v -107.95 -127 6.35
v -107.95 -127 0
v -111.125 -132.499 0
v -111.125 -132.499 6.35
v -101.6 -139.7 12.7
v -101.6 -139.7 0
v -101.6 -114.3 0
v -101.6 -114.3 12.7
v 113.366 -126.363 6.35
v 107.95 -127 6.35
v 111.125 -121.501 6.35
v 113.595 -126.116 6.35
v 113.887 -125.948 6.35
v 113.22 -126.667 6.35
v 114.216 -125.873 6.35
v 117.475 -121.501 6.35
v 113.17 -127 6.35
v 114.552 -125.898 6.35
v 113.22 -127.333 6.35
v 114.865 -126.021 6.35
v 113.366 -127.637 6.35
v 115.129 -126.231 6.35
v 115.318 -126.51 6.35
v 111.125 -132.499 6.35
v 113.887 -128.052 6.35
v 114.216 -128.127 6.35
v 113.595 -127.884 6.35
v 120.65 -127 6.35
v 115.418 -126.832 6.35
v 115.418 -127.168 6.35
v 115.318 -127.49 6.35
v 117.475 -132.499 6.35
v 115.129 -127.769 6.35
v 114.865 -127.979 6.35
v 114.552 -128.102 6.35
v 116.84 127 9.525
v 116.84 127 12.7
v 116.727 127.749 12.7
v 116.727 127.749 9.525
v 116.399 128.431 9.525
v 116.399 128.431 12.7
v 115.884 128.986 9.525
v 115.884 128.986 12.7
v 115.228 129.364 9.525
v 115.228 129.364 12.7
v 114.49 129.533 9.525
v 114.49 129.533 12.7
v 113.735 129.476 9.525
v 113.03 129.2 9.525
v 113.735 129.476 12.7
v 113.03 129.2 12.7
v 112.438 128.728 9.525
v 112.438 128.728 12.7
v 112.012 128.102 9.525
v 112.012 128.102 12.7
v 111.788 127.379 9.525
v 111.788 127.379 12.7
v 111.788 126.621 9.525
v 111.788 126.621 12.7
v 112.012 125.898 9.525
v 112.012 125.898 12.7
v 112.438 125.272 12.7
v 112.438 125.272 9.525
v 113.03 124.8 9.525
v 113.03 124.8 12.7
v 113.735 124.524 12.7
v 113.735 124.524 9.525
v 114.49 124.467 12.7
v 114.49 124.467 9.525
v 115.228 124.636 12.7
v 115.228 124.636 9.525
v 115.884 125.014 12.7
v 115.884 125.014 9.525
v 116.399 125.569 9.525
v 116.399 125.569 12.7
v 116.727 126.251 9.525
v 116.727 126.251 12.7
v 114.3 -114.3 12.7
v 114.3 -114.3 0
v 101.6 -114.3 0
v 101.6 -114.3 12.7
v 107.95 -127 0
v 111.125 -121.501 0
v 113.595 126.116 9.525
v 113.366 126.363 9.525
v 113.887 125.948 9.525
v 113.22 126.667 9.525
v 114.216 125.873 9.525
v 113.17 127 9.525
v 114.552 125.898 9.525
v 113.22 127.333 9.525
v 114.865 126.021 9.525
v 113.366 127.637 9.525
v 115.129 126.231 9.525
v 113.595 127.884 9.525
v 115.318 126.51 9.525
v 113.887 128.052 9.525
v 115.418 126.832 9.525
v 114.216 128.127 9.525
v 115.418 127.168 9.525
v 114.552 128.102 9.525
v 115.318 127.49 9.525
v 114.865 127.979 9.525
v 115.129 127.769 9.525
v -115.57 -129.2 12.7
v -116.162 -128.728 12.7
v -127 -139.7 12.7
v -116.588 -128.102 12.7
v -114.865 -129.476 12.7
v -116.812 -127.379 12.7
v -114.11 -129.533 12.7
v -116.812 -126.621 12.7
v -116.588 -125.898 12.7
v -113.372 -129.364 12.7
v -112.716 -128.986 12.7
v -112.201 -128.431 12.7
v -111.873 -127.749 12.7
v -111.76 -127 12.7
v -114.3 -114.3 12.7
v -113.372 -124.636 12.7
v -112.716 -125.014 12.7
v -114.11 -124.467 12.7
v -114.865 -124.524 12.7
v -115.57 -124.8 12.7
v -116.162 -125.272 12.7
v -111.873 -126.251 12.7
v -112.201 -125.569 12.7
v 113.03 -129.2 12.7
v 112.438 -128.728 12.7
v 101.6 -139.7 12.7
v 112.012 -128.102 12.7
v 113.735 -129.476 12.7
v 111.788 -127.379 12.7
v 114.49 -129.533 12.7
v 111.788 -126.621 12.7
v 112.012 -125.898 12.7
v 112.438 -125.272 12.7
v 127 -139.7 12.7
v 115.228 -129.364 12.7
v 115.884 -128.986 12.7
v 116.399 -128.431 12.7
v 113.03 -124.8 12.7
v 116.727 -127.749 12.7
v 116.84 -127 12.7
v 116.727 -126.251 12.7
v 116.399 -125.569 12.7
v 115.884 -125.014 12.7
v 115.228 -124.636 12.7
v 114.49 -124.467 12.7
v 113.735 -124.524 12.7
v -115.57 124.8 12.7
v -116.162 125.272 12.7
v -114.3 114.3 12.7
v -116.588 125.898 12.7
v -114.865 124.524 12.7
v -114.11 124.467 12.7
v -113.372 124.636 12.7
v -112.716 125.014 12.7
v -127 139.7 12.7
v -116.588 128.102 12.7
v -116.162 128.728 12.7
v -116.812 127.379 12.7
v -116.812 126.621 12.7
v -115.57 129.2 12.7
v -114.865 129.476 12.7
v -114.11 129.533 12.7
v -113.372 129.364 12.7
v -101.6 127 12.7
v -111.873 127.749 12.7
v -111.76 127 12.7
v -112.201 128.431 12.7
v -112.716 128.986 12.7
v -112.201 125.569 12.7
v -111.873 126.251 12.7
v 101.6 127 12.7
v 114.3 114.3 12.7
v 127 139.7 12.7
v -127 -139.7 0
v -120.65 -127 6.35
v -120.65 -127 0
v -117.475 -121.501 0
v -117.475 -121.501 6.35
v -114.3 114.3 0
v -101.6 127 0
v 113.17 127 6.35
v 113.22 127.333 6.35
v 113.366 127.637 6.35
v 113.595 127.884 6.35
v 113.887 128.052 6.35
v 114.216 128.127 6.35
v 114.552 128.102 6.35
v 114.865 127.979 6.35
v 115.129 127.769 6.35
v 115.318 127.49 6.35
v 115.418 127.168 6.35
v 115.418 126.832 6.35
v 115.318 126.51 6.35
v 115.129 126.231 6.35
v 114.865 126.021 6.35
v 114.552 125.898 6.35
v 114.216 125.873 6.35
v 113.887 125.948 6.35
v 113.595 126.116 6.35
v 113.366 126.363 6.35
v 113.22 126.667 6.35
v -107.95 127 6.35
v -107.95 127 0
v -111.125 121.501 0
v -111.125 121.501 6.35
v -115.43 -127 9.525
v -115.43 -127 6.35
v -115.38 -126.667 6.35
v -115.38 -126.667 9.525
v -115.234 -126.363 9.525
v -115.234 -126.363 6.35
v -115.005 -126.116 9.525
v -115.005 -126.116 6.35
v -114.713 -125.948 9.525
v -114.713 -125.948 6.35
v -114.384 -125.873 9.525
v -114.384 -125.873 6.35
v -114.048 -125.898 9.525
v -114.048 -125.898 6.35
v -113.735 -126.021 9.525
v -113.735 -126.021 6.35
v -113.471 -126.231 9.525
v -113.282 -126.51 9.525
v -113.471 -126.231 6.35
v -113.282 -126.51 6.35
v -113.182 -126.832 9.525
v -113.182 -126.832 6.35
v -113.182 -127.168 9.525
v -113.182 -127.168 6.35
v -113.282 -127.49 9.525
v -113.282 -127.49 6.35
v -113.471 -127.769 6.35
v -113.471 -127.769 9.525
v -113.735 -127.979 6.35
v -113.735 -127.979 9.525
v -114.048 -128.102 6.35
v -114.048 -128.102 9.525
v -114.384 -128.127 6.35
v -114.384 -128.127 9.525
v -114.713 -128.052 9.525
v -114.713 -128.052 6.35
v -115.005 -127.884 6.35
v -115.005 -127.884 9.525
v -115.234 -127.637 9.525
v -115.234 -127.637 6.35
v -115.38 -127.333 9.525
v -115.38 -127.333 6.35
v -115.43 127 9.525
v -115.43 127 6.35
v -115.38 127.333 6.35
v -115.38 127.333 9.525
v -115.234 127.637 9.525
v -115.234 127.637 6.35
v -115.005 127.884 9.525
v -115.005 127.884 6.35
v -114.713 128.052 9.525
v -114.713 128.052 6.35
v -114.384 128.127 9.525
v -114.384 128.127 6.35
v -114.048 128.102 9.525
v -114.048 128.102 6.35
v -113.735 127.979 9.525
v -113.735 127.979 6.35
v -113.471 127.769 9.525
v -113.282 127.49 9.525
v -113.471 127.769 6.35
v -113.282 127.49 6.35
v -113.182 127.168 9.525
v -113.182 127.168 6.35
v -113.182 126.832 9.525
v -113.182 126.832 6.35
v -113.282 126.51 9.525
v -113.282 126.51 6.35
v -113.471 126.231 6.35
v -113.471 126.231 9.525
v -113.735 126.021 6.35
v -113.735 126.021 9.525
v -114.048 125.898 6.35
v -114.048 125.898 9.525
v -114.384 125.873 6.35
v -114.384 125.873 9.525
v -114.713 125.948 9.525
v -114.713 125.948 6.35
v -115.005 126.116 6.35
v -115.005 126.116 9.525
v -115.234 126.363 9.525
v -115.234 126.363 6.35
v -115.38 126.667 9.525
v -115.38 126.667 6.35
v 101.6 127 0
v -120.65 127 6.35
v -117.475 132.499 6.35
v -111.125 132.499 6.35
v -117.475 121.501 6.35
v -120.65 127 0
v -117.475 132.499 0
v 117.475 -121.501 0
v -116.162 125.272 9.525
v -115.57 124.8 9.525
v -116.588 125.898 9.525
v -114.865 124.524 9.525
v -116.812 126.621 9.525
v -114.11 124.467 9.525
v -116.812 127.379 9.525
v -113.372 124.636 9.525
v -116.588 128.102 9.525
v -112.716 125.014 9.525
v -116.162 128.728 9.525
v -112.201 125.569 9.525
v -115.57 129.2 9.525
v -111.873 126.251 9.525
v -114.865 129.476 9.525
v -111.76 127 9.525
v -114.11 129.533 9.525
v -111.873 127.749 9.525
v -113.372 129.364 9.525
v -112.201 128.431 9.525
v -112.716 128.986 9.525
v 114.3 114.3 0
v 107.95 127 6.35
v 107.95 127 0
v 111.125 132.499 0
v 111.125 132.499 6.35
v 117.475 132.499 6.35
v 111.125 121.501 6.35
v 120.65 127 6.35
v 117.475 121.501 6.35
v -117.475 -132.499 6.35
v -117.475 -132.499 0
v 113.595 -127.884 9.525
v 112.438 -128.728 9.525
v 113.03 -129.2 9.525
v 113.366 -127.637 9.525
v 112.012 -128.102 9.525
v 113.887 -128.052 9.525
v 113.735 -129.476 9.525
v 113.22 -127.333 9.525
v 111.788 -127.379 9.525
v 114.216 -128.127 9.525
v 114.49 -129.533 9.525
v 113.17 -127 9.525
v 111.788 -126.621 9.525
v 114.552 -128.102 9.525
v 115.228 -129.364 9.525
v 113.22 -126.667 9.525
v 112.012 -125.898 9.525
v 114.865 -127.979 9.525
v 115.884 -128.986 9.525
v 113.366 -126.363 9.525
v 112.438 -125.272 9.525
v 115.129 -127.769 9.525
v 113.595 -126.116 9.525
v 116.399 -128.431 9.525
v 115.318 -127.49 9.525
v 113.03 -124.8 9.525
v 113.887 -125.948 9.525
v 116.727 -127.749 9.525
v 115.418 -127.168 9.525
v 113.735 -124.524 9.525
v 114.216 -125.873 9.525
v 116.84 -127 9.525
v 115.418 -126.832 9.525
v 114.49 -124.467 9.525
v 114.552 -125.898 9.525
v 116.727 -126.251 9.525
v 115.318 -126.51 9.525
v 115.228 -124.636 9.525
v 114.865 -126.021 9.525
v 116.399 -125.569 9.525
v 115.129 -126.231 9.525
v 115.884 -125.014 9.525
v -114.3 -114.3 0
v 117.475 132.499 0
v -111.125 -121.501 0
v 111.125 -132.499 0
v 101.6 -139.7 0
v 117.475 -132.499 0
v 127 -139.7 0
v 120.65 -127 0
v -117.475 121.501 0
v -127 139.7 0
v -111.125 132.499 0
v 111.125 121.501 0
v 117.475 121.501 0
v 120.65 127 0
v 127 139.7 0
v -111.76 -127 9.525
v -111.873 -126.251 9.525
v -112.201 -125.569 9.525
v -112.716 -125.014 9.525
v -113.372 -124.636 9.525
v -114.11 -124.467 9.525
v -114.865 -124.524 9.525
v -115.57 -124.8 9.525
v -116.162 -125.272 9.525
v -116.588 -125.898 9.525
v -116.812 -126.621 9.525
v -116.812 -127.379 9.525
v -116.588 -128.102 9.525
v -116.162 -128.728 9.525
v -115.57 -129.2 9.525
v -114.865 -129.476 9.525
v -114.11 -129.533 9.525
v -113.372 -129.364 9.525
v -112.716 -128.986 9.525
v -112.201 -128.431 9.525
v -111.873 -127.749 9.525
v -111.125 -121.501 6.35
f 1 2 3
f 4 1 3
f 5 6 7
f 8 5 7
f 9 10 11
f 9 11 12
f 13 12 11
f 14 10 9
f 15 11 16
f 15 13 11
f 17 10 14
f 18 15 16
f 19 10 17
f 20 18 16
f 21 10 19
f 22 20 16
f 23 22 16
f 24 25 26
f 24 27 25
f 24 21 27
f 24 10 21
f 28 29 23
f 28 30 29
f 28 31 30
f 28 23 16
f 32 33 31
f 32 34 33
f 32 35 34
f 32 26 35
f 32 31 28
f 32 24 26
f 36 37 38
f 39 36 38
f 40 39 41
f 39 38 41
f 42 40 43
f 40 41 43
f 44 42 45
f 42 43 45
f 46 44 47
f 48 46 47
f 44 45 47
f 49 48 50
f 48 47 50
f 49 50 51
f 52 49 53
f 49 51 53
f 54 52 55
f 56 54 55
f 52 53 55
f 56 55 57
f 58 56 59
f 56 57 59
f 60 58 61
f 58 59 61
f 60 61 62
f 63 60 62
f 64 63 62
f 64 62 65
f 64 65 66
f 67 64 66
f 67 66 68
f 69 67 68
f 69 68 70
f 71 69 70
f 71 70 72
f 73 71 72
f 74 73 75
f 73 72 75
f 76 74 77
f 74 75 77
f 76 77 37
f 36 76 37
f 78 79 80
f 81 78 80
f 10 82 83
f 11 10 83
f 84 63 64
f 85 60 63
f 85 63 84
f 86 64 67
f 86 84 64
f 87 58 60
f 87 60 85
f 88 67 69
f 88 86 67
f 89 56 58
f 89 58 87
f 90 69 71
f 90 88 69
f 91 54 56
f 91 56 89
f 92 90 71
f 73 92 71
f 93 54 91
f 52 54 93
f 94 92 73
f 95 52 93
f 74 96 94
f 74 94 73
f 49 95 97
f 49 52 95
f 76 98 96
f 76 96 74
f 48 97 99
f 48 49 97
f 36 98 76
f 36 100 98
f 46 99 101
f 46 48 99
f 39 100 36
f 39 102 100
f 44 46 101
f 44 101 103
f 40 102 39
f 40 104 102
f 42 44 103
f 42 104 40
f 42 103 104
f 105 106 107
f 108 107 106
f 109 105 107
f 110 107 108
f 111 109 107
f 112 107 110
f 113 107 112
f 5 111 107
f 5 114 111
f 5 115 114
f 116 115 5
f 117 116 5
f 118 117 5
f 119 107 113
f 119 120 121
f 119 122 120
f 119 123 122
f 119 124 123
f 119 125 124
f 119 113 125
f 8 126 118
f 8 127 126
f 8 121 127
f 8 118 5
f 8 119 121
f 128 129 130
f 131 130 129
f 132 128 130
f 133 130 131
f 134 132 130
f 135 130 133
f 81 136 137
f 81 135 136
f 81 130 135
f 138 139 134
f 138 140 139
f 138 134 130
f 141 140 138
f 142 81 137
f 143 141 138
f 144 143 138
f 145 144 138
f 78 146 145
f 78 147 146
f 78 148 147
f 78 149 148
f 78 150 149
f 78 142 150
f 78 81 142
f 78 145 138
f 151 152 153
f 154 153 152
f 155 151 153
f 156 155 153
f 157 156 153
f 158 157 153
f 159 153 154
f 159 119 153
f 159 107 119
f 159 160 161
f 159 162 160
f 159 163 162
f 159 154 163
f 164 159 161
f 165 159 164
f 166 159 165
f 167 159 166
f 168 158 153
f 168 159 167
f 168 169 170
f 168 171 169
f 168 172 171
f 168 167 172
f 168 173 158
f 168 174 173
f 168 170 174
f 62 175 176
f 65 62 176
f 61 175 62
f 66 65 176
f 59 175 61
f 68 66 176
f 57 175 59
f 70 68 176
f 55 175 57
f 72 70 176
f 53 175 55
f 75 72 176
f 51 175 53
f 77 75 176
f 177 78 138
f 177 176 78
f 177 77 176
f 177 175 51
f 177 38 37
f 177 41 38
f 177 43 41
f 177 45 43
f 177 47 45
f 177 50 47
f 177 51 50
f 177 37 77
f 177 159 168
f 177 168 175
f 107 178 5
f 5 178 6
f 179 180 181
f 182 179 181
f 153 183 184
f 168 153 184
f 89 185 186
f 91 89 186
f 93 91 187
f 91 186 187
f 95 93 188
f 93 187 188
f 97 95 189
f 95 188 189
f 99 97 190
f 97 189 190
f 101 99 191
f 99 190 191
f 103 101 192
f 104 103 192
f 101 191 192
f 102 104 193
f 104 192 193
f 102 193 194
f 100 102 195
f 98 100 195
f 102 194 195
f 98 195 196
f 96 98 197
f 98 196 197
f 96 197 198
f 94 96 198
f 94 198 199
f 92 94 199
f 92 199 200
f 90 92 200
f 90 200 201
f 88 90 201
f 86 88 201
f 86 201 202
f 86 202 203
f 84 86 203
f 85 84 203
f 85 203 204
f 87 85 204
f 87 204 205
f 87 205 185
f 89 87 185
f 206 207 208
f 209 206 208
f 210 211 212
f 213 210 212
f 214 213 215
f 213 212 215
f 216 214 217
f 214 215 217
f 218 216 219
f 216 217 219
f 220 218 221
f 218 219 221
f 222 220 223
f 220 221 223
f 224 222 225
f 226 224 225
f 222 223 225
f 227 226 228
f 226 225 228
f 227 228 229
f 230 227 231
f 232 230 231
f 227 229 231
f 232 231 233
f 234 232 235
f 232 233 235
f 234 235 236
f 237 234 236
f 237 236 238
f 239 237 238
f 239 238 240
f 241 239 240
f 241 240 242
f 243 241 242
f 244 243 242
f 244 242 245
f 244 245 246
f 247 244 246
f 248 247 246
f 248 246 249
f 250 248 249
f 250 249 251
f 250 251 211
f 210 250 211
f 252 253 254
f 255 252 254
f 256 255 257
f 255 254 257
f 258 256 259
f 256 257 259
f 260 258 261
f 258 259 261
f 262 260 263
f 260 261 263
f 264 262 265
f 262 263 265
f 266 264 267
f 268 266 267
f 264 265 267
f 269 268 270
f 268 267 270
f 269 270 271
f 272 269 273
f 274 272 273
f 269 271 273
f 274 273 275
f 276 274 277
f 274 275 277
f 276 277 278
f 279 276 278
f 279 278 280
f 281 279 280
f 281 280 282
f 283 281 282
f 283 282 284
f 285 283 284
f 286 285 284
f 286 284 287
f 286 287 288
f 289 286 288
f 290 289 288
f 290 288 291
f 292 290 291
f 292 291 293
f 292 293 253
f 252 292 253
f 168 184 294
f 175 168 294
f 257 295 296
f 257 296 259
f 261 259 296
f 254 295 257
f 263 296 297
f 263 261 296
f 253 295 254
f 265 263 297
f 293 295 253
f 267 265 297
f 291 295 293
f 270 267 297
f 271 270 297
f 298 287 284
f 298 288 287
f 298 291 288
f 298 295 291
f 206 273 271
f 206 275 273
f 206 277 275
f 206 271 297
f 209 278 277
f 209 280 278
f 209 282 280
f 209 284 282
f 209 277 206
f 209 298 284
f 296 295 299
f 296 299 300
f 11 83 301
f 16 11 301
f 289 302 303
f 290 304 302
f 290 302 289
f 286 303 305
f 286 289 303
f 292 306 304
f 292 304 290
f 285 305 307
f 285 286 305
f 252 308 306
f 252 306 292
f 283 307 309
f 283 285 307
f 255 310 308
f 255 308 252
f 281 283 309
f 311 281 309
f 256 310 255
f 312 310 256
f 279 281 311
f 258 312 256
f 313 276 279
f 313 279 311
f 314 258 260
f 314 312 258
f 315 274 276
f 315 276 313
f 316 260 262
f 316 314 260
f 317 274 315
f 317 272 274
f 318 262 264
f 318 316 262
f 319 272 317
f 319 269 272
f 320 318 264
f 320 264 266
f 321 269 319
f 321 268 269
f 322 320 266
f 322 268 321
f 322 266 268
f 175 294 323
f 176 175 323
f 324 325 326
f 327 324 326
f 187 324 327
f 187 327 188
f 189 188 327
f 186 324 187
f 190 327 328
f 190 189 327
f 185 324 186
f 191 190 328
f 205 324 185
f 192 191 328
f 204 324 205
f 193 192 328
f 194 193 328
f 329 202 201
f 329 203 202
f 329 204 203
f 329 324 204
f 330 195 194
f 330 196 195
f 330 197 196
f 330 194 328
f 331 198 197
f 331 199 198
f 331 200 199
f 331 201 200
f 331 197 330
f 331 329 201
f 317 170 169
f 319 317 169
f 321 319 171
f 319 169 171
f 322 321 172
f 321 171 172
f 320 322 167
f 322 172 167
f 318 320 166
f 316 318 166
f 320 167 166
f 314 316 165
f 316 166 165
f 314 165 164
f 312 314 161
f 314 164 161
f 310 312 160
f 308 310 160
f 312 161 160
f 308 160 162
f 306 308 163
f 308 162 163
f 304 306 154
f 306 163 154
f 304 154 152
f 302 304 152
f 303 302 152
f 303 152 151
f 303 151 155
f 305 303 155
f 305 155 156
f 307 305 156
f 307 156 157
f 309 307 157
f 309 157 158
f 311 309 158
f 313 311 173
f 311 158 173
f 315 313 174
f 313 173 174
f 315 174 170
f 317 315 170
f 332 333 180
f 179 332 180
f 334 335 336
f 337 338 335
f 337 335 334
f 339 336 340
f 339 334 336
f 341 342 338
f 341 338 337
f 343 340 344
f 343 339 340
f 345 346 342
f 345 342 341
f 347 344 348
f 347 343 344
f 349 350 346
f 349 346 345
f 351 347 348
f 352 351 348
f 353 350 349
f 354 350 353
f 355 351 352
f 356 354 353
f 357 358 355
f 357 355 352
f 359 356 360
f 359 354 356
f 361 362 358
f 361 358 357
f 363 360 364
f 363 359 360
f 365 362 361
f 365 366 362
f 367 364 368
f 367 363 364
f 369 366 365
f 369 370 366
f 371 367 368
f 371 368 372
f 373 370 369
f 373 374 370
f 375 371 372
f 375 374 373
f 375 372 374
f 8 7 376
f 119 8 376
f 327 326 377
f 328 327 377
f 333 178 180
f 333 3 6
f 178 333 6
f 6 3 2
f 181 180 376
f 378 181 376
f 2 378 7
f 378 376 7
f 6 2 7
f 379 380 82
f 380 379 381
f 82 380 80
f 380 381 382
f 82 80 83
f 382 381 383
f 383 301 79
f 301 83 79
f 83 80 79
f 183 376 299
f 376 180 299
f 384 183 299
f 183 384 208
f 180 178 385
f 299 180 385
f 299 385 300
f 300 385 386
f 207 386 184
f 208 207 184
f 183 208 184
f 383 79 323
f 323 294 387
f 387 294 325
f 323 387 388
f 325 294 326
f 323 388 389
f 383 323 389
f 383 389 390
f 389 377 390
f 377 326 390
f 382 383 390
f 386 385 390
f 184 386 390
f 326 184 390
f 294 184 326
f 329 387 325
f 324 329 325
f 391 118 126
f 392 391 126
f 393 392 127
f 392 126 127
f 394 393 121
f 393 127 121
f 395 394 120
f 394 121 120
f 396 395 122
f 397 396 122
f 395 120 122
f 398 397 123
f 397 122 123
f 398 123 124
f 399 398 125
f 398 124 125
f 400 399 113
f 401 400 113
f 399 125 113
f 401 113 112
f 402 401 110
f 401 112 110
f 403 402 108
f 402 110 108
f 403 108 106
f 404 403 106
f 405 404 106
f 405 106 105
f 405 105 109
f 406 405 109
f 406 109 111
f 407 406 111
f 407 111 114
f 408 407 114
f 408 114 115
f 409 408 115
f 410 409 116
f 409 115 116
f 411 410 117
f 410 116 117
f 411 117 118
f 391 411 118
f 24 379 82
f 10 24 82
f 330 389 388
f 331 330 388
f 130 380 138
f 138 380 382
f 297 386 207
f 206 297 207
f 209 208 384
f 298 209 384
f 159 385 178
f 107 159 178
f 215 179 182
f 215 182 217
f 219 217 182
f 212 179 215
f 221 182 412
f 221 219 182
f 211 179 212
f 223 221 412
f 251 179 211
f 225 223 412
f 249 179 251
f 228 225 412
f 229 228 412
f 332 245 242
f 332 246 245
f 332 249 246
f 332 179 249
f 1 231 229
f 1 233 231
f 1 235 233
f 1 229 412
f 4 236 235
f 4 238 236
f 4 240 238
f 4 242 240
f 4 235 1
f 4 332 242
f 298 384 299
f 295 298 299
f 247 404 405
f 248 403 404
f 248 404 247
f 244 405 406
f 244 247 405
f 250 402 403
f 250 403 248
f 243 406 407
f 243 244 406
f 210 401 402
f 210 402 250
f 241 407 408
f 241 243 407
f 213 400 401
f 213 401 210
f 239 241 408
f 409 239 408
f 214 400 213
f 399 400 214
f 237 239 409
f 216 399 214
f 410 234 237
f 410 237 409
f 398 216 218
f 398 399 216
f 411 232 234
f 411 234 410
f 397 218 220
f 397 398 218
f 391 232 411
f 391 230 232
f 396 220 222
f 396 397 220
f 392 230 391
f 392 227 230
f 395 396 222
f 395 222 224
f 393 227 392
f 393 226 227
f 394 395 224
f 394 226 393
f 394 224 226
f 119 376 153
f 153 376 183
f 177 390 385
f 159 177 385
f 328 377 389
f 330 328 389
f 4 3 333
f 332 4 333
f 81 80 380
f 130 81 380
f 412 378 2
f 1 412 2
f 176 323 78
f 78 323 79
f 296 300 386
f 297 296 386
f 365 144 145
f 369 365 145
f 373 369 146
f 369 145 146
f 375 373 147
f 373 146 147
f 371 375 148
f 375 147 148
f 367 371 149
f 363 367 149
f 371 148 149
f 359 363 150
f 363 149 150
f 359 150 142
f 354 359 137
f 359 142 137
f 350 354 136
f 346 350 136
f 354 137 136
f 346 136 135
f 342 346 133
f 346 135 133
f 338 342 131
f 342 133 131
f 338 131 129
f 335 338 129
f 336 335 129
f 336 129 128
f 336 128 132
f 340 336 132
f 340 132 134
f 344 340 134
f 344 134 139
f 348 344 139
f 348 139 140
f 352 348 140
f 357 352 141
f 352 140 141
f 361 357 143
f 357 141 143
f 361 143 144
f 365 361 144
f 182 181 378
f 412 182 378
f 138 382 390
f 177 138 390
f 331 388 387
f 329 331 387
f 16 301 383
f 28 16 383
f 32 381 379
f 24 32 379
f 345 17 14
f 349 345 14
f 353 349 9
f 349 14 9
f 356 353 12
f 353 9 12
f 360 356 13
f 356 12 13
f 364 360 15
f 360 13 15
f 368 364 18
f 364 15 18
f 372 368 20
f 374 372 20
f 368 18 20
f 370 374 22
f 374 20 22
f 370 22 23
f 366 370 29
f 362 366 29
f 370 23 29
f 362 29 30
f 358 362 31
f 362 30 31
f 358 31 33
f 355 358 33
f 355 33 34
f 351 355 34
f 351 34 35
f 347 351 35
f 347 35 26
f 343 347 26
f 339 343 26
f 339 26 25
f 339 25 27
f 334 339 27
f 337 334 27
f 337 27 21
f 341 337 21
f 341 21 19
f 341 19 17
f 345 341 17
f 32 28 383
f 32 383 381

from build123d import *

# Parameters (mm, degrees)
F1_DEPTH = 12.7
F4_DEPTH = 6.35
F6_D     = 2.2606
F6_DEPTH = 12.7
F6_TIP   = 0.6791527577
F7_R     = 2.54
F8_DEPTH = 3.175


with BuildPart() as f1:
    # F0 (on Top) → F1 (new body)
    with BuildSketch(Plane.XY):
        Polygon((-101.6, 127), (101.6, 127), (114.3, 114.3), (114.3, -114.3), (101.6, -114.3), (101.6, -139.7), (114.3, -139.7), (127, -139.7), (127, -114.3), (127, 114.3), (127, 139.7), (101.6, 139.7), (-101.6, 139.7), (-127, 139.7), (-127, 114.3), (-127, -114.3), (-127, -139.7), (-114.3, -139.7), (-101.6, -139.7), (-101.6, -114.3), (-114.3, -114.3), (-114.3, 114.3), align=None)
    extrude(amount=F1_DEPTH)

    # F3 (on face) → F4 (cut)
    with BuildSketch(Plane(origin=(0, 0, 0), x_dir=(1, 0, 0), z_dir=(0, 0, -1))):
        Polygon((-117.475, 121.500738686), (-111.125, 121.500738686), (-107.95, 127), (-111.125, 132.499261314), (-117.475, 132.499261314), (-120.65, 127), align=None)
        Polygon((-107.95, -127), (-111.125, -121.500738686), (-117.475, -121.500738686), (-120.65, -127), (-117.475, -132.499261314), (-111.125, -132.499261314), align=None)
        Polygon((120.65, -127), (117.475, -121.500738686), (111.125, -121.500738686), (107.95, -127), (111.125, -132.499261314), (117.475, -132.499261314), align=None)
        Polygon((120.65, 127), (117.475, 132.499261314), (111.125, 132.499261314), (107.95, 127), (111.125, 121.500738686), (117.475, 121.500738686), align=None)
    extrude(amount=-F4_DEPTH, mode=Mode.SUBTRACT)

    # F6
    with Locations(Plane.XY.offset(12.7)):
        with Locations((-114.3, 127), (-114.3, -127), (114.3, -127), (114.3, 127)):
            Hole(F6_D / 2, depth=F6_DEPTH)
            with Locations((0, 0, -(F6_DEPTH + F6_TIP / 2))):  # 118° drill point
                Cone(0, F6_D / 2, F6_TIP, mode=Mode.SUBTRACT)

    # F7 (on face) → F8 (cut)
    with BuildSketch(Plane.XY.offset(12.7)):
        with Locations((-114.3, 127)):
            Circle(F7_R)
        with Locations((114.3, 127)):
            Circle(F7_R)
        with Locations((114.3, -127)):
            Circle(F7_R)
        with Locations((-114.3, -127)):
            Circle(F7_R)
    extrude(amount=-F8_DEPTH, mode=Mode.SUBTRACT)


solid = f1.part
